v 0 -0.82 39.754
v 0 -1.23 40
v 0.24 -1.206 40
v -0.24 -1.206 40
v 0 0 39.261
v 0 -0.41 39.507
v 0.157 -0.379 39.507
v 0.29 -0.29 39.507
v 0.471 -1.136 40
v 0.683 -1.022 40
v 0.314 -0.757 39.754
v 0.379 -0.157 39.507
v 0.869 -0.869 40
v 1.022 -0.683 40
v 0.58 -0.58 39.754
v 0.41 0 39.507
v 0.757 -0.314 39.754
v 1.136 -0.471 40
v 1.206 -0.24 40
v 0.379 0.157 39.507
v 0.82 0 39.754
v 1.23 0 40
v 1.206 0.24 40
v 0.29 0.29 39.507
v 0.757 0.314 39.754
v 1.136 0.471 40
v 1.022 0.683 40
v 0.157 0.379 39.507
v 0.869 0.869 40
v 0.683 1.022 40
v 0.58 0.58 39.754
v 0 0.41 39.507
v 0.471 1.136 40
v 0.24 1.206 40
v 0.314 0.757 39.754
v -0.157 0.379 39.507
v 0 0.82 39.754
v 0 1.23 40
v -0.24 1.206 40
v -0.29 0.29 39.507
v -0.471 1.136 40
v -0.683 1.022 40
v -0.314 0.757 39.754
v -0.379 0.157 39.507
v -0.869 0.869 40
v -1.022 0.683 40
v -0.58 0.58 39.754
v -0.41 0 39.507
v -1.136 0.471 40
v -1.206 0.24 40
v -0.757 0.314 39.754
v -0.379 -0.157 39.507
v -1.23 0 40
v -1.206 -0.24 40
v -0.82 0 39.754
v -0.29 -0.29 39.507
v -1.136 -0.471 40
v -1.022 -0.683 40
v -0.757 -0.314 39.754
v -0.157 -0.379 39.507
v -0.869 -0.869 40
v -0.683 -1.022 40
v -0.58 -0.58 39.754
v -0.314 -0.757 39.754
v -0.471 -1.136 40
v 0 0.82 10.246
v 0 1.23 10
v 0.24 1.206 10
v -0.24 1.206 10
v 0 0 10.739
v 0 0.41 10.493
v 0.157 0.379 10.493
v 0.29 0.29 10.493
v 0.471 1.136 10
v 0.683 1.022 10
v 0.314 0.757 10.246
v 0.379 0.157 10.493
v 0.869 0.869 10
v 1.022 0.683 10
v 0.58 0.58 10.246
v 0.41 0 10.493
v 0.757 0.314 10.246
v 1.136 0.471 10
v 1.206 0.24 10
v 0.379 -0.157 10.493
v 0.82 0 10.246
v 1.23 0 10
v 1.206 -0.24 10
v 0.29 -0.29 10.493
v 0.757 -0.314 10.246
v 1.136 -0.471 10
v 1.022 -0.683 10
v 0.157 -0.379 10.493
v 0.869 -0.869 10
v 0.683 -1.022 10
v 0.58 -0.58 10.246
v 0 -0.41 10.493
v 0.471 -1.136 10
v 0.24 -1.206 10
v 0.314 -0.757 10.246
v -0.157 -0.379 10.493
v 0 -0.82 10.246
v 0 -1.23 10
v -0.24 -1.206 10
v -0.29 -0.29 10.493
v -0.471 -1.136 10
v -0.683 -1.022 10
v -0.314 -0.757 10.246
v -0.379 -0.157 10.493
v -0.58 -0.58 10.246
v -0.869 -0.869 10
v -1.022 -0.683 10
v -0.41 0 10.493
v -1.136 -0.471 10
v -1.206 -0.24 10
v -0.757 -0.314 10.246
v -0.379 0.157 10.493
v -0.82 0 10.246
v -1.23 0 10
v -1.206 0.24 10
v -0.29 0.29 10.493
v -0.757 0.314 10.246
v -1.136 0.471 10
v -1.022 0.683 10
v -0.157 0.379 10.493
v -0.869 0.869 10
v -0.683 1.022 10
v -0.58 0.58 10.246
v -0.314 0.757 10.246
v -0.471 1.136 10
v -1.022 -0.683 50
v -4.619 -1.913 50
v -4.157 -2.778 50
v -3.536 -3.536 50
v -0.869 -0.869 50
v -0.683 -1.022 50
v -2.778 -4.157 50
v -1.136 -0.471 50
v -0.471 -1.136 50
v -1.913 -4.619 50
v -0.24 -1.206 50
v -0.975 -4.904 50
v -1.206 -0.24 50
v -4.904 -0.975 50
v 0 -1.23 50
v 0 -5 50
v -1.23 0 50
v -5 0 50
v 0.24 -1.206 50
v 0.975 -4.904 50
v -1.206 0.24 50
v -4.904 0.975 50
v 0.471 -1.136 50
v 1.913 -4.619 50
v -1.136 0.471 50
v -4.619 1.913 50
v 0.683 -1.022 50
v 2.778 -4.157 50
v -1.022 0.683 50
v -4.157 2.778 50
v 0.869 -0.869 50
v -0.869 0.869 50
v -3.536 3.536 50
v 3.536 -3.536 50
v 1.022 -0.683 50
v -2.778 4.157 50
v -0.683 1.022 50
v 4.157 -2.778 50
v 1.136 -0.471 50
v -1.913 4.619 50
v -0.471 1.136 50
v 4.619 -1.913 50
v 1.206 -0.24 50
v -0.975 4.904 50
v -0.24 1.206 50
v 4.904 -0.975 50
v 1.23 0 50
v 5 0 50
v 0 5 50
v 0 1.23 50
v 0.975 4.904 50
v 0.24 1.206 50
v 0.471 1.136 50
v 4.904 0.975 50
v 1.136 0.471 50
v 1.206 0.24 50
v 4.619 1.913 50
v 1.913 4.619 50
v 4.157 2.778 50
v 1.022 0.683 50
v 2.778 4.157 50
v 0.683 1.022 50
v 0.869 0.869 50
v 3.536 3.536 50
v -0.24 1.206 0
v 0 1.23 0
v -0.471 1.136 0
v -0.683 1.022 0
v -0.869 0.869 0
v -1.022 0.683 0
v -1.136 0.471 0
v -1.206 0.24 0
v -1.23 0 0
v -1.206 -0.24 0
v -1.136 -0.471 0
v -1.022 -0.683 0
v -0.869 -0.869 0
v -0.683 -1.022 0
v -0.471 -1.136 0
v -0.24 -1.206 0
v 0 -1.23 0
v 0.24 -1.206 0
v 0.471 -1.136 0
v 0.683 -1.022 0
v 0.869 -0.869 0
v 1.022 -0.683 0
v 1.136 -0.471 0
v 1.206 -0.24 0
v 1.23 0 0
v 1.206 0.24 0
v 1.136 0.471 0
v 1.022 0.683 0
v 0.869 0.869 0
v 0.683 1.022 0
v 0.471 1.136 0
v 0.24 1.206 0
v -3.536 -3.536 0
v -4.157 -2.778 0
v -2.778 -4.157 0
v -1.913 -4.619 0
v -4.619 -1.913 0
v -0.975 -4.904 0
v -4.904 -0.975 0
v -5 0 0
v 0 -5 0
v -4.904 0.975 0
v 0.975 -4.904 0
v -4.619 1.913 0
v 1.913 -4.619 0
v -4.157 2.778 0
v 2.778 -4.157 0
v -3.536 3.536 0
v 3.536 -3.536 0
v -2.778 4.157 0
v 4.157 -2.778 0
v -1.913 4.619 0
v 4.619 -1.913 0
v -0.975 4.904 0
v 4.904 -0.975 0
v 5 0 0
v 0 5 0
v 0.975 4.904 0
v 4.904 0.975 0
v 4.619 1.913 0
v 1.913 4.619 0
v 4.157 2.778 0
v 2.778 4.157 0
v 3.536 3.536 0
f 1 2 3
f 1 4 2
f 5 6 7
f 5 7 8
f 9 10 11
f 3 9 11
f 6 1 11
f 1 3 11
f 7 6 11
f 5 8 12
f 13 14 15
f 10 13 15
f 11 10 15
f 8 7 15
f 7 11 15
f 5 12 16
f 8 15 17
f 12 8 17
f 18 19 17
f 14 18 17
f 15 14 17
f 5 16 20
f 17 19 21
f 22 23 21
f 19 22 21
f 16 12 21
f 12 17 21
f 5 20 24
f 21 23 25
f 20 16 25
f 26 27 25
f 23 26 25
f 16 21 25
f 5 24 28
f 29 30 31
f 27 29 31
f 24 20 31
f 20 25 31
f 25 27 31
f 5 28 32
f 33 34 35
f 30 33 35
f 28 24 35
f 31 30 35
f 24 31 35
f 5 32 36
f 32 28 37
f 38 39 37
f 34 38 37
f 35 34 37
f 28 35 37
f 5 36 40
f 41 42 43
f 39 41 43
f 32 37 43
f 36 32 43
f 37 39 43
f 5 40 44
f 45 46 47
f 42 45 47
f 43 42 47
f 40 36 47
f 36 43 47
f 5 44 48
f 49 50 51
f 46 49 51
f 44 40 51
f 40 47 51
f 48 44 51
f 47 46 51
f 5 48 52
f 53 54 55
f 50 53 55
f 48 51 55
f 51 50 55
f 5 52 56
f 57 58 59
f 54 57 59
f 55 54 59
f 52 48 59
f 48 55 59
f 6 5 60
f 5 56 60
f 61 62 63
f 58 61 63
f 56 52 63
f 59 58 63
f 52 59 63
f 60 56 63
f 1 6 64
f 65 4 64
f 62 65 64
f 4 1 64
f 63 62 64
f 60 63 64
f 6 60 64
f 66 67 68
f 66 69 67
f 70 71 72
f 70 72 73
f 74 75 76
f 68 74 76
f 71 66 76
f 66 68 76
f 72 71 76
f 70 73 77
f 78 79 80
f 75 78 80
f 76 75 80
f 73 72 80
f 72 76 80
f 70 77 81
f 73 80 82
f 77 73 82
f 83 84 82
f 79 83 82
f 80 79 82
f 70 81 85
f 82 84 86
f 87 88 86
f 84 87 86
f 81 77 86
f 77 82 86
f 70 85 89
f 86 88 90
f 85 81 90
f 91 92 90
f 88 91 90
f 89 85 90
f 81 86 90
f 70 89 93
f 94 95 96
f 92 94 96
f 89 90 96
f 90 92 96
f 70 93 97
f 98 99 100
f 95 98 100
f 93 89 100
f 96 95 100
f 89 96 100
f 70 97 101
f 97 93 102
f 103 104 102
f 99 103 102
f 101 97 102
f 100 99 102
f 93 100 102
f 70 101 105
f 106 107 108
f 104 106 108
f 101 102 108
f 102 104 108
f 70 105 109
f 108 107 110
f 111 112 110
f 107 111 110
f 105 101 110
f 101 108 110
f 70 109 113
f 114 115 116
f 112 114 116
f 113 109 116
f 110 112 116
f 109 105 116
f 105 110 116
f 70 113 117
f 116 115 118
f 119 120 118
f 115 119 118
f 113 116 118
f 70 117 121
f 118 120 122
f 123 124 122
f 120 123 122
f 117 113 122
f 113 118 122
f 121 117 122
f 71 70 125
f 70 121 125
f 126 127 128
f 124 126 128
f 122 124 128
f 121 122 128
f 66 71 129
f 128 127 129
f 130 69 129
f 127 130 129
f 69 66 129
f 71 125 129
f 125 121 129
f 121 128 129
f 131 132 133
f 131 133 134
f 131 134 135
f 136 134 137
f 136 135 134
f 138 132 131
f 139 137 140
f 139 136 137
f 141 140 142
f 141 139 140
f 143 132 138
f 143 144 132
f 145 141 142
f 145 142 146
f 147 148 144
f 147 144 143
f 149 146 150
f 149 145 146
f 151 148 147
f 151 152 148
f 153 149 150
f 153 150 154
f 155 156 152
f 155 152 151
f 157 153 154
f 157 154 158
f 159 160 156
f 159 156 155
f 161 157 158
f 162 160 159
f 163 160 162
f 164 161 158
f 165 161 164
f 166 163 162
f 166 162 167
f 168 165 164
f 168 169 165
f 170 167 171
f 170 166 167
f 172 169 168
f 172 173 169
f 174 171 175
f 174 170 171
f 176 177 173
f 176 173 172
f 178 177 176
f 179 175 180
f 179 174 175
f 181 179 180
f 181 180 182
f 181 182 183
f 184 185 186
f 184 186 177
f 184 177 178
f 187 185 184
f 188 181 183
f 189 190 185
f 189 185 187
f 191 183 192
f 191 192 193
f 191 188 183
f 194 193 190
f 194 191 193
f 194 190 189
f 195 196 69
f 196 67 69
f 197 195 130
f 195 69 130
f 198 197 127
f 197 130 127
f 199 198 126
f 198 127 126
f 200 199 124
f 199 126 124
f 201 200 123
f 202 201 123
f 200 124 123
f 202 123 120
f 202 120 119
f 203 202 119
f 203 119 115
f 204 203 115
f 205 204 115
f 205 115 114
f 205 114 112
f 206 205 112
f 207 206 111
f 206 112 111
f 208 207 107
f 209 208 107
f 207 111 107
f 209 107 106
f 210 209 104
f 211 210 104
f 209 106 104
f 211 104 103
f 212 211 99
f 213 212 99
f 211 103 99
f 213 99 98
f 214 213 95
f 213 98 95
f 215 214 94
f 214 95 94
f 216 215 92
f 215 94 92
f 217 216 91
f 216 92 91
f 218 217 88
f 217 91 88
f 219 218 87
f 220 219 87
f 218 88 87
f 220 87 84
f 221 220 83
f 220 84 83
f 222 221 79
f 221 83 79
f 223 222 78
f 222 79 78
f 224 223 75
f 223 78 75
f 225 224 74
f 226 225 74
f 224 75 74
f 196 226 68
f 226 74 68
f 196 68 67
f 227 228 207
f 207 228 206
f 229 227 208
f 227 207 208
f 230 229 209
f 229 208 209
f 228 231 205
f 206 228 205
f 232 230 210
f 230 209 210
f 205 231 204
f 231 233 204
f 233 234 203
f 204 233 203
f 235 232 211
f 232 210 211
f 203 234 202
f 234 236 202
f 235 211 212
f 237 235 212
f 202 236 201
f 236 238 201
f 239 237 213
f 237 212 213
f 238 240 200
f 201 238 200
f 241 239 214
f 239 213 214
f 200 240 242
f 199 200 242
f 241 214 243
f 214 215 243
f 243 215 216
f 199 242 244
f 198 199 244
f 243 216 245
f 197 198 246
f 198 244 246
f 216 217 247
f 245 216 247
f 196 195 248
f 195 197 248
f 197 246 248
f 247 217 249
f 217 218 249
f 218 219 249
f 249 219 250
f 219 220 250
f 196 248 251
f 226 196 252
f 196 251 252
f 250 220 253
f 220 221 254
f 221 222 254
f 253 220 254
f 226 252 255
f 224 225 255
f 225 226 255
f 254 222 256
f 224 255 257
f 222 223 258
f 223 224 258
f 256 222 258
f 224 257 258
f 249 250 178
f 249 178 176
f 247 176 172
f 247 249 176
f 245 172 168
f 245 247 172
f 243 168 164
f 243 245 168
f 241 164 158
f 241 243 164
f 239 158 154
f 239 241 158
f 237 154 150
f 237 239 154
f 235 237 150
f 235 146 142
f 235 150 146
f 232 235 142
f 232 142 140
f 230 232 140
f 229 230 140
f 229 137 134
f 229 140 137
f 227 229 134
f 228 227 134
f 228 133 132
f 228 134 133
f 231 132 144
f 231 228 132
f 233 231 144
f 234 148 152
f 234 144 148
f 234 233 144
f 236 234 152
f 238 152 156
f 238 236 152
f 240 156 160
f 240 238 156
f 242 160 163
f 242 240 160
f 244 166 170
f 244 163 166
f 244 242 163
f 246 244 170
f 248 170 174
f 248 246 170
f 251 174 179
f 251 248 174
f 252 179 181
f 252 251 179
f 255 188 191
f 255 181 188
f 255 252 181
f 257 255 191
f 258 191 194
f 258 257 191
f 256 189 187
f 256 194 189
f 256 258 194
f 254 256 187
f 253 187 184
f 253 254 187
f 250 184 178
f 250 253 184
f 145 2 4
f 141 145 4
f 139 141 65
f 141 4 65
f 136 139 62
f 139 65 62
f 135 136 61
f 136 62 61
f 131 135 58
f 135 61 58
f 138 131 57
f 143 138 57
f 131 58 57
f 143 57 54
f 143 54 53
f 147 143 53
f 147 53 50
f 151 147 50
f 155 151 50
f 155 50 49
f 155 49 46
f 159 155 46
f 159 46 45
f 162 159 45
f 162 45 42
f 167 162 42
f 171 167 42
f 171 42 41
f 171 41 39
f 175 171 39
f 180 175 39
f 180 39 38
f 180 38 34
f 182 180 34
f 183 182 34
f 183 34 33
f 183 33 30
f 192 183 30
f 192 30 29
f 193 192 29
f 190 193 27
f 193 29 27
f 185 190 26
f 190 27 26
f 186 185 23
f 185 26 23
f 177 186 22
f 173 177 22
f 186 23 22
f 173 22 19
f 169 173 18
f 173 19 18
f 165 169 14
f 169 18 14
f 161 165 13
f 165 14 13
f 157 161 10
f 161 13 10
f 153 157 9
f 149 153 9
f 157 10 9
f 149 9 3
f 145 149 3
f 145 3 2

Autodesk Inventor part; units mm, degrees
ref_plane "YZ Plane" through (0, 0, 0) normal (1, 0, 0) x (0, 1, 0)
ref_plane "XZ Plane" through (0, 0, 0) normal (0, 1, 0) x (-1, 0, 0)
ref_plane "XY Plane" through (0, 0, 0) normal (0, 0, 1) x (1, 0, 0)
sketch "Sketch1" plane through (0, 0, 0) normal (0, 0, 1) x (1, 0, 0)
  circle A0 centre (0, 0) radius 5
  dimension "d0" = 10
extrude "Extrusion1" add sketch "Sketch1" along normal blind 50
sketch "Sketch2" plane through (0, 0, 50) normal (0, 0, 1) x (1, 0, 0)
  point P0 (0, 0)
  point P1 (0, 0)
sketch "Sketch3" plane through (0, 0, 0) normal (0, 0, -1) x (-1, 0, 0)
  point P0 (0, 0)
  point P1 (0, 0)
hole "Hole1" at (0, 0, 0) direction (0, 0, 1) diameter 2.459 depth 10 tip angle 118 thread size "M3x0.5" class "6H" standard "ANSI Metric M Profile"
hole "Hole2" at (0, 0, 50) direction (0, 0, -1) diameter 2.459 depth 10 tip angle 118 thread size "M3x0.5" class "6H" standard "ANSI Metric M Profile"
properties part number "SheetConnector"
